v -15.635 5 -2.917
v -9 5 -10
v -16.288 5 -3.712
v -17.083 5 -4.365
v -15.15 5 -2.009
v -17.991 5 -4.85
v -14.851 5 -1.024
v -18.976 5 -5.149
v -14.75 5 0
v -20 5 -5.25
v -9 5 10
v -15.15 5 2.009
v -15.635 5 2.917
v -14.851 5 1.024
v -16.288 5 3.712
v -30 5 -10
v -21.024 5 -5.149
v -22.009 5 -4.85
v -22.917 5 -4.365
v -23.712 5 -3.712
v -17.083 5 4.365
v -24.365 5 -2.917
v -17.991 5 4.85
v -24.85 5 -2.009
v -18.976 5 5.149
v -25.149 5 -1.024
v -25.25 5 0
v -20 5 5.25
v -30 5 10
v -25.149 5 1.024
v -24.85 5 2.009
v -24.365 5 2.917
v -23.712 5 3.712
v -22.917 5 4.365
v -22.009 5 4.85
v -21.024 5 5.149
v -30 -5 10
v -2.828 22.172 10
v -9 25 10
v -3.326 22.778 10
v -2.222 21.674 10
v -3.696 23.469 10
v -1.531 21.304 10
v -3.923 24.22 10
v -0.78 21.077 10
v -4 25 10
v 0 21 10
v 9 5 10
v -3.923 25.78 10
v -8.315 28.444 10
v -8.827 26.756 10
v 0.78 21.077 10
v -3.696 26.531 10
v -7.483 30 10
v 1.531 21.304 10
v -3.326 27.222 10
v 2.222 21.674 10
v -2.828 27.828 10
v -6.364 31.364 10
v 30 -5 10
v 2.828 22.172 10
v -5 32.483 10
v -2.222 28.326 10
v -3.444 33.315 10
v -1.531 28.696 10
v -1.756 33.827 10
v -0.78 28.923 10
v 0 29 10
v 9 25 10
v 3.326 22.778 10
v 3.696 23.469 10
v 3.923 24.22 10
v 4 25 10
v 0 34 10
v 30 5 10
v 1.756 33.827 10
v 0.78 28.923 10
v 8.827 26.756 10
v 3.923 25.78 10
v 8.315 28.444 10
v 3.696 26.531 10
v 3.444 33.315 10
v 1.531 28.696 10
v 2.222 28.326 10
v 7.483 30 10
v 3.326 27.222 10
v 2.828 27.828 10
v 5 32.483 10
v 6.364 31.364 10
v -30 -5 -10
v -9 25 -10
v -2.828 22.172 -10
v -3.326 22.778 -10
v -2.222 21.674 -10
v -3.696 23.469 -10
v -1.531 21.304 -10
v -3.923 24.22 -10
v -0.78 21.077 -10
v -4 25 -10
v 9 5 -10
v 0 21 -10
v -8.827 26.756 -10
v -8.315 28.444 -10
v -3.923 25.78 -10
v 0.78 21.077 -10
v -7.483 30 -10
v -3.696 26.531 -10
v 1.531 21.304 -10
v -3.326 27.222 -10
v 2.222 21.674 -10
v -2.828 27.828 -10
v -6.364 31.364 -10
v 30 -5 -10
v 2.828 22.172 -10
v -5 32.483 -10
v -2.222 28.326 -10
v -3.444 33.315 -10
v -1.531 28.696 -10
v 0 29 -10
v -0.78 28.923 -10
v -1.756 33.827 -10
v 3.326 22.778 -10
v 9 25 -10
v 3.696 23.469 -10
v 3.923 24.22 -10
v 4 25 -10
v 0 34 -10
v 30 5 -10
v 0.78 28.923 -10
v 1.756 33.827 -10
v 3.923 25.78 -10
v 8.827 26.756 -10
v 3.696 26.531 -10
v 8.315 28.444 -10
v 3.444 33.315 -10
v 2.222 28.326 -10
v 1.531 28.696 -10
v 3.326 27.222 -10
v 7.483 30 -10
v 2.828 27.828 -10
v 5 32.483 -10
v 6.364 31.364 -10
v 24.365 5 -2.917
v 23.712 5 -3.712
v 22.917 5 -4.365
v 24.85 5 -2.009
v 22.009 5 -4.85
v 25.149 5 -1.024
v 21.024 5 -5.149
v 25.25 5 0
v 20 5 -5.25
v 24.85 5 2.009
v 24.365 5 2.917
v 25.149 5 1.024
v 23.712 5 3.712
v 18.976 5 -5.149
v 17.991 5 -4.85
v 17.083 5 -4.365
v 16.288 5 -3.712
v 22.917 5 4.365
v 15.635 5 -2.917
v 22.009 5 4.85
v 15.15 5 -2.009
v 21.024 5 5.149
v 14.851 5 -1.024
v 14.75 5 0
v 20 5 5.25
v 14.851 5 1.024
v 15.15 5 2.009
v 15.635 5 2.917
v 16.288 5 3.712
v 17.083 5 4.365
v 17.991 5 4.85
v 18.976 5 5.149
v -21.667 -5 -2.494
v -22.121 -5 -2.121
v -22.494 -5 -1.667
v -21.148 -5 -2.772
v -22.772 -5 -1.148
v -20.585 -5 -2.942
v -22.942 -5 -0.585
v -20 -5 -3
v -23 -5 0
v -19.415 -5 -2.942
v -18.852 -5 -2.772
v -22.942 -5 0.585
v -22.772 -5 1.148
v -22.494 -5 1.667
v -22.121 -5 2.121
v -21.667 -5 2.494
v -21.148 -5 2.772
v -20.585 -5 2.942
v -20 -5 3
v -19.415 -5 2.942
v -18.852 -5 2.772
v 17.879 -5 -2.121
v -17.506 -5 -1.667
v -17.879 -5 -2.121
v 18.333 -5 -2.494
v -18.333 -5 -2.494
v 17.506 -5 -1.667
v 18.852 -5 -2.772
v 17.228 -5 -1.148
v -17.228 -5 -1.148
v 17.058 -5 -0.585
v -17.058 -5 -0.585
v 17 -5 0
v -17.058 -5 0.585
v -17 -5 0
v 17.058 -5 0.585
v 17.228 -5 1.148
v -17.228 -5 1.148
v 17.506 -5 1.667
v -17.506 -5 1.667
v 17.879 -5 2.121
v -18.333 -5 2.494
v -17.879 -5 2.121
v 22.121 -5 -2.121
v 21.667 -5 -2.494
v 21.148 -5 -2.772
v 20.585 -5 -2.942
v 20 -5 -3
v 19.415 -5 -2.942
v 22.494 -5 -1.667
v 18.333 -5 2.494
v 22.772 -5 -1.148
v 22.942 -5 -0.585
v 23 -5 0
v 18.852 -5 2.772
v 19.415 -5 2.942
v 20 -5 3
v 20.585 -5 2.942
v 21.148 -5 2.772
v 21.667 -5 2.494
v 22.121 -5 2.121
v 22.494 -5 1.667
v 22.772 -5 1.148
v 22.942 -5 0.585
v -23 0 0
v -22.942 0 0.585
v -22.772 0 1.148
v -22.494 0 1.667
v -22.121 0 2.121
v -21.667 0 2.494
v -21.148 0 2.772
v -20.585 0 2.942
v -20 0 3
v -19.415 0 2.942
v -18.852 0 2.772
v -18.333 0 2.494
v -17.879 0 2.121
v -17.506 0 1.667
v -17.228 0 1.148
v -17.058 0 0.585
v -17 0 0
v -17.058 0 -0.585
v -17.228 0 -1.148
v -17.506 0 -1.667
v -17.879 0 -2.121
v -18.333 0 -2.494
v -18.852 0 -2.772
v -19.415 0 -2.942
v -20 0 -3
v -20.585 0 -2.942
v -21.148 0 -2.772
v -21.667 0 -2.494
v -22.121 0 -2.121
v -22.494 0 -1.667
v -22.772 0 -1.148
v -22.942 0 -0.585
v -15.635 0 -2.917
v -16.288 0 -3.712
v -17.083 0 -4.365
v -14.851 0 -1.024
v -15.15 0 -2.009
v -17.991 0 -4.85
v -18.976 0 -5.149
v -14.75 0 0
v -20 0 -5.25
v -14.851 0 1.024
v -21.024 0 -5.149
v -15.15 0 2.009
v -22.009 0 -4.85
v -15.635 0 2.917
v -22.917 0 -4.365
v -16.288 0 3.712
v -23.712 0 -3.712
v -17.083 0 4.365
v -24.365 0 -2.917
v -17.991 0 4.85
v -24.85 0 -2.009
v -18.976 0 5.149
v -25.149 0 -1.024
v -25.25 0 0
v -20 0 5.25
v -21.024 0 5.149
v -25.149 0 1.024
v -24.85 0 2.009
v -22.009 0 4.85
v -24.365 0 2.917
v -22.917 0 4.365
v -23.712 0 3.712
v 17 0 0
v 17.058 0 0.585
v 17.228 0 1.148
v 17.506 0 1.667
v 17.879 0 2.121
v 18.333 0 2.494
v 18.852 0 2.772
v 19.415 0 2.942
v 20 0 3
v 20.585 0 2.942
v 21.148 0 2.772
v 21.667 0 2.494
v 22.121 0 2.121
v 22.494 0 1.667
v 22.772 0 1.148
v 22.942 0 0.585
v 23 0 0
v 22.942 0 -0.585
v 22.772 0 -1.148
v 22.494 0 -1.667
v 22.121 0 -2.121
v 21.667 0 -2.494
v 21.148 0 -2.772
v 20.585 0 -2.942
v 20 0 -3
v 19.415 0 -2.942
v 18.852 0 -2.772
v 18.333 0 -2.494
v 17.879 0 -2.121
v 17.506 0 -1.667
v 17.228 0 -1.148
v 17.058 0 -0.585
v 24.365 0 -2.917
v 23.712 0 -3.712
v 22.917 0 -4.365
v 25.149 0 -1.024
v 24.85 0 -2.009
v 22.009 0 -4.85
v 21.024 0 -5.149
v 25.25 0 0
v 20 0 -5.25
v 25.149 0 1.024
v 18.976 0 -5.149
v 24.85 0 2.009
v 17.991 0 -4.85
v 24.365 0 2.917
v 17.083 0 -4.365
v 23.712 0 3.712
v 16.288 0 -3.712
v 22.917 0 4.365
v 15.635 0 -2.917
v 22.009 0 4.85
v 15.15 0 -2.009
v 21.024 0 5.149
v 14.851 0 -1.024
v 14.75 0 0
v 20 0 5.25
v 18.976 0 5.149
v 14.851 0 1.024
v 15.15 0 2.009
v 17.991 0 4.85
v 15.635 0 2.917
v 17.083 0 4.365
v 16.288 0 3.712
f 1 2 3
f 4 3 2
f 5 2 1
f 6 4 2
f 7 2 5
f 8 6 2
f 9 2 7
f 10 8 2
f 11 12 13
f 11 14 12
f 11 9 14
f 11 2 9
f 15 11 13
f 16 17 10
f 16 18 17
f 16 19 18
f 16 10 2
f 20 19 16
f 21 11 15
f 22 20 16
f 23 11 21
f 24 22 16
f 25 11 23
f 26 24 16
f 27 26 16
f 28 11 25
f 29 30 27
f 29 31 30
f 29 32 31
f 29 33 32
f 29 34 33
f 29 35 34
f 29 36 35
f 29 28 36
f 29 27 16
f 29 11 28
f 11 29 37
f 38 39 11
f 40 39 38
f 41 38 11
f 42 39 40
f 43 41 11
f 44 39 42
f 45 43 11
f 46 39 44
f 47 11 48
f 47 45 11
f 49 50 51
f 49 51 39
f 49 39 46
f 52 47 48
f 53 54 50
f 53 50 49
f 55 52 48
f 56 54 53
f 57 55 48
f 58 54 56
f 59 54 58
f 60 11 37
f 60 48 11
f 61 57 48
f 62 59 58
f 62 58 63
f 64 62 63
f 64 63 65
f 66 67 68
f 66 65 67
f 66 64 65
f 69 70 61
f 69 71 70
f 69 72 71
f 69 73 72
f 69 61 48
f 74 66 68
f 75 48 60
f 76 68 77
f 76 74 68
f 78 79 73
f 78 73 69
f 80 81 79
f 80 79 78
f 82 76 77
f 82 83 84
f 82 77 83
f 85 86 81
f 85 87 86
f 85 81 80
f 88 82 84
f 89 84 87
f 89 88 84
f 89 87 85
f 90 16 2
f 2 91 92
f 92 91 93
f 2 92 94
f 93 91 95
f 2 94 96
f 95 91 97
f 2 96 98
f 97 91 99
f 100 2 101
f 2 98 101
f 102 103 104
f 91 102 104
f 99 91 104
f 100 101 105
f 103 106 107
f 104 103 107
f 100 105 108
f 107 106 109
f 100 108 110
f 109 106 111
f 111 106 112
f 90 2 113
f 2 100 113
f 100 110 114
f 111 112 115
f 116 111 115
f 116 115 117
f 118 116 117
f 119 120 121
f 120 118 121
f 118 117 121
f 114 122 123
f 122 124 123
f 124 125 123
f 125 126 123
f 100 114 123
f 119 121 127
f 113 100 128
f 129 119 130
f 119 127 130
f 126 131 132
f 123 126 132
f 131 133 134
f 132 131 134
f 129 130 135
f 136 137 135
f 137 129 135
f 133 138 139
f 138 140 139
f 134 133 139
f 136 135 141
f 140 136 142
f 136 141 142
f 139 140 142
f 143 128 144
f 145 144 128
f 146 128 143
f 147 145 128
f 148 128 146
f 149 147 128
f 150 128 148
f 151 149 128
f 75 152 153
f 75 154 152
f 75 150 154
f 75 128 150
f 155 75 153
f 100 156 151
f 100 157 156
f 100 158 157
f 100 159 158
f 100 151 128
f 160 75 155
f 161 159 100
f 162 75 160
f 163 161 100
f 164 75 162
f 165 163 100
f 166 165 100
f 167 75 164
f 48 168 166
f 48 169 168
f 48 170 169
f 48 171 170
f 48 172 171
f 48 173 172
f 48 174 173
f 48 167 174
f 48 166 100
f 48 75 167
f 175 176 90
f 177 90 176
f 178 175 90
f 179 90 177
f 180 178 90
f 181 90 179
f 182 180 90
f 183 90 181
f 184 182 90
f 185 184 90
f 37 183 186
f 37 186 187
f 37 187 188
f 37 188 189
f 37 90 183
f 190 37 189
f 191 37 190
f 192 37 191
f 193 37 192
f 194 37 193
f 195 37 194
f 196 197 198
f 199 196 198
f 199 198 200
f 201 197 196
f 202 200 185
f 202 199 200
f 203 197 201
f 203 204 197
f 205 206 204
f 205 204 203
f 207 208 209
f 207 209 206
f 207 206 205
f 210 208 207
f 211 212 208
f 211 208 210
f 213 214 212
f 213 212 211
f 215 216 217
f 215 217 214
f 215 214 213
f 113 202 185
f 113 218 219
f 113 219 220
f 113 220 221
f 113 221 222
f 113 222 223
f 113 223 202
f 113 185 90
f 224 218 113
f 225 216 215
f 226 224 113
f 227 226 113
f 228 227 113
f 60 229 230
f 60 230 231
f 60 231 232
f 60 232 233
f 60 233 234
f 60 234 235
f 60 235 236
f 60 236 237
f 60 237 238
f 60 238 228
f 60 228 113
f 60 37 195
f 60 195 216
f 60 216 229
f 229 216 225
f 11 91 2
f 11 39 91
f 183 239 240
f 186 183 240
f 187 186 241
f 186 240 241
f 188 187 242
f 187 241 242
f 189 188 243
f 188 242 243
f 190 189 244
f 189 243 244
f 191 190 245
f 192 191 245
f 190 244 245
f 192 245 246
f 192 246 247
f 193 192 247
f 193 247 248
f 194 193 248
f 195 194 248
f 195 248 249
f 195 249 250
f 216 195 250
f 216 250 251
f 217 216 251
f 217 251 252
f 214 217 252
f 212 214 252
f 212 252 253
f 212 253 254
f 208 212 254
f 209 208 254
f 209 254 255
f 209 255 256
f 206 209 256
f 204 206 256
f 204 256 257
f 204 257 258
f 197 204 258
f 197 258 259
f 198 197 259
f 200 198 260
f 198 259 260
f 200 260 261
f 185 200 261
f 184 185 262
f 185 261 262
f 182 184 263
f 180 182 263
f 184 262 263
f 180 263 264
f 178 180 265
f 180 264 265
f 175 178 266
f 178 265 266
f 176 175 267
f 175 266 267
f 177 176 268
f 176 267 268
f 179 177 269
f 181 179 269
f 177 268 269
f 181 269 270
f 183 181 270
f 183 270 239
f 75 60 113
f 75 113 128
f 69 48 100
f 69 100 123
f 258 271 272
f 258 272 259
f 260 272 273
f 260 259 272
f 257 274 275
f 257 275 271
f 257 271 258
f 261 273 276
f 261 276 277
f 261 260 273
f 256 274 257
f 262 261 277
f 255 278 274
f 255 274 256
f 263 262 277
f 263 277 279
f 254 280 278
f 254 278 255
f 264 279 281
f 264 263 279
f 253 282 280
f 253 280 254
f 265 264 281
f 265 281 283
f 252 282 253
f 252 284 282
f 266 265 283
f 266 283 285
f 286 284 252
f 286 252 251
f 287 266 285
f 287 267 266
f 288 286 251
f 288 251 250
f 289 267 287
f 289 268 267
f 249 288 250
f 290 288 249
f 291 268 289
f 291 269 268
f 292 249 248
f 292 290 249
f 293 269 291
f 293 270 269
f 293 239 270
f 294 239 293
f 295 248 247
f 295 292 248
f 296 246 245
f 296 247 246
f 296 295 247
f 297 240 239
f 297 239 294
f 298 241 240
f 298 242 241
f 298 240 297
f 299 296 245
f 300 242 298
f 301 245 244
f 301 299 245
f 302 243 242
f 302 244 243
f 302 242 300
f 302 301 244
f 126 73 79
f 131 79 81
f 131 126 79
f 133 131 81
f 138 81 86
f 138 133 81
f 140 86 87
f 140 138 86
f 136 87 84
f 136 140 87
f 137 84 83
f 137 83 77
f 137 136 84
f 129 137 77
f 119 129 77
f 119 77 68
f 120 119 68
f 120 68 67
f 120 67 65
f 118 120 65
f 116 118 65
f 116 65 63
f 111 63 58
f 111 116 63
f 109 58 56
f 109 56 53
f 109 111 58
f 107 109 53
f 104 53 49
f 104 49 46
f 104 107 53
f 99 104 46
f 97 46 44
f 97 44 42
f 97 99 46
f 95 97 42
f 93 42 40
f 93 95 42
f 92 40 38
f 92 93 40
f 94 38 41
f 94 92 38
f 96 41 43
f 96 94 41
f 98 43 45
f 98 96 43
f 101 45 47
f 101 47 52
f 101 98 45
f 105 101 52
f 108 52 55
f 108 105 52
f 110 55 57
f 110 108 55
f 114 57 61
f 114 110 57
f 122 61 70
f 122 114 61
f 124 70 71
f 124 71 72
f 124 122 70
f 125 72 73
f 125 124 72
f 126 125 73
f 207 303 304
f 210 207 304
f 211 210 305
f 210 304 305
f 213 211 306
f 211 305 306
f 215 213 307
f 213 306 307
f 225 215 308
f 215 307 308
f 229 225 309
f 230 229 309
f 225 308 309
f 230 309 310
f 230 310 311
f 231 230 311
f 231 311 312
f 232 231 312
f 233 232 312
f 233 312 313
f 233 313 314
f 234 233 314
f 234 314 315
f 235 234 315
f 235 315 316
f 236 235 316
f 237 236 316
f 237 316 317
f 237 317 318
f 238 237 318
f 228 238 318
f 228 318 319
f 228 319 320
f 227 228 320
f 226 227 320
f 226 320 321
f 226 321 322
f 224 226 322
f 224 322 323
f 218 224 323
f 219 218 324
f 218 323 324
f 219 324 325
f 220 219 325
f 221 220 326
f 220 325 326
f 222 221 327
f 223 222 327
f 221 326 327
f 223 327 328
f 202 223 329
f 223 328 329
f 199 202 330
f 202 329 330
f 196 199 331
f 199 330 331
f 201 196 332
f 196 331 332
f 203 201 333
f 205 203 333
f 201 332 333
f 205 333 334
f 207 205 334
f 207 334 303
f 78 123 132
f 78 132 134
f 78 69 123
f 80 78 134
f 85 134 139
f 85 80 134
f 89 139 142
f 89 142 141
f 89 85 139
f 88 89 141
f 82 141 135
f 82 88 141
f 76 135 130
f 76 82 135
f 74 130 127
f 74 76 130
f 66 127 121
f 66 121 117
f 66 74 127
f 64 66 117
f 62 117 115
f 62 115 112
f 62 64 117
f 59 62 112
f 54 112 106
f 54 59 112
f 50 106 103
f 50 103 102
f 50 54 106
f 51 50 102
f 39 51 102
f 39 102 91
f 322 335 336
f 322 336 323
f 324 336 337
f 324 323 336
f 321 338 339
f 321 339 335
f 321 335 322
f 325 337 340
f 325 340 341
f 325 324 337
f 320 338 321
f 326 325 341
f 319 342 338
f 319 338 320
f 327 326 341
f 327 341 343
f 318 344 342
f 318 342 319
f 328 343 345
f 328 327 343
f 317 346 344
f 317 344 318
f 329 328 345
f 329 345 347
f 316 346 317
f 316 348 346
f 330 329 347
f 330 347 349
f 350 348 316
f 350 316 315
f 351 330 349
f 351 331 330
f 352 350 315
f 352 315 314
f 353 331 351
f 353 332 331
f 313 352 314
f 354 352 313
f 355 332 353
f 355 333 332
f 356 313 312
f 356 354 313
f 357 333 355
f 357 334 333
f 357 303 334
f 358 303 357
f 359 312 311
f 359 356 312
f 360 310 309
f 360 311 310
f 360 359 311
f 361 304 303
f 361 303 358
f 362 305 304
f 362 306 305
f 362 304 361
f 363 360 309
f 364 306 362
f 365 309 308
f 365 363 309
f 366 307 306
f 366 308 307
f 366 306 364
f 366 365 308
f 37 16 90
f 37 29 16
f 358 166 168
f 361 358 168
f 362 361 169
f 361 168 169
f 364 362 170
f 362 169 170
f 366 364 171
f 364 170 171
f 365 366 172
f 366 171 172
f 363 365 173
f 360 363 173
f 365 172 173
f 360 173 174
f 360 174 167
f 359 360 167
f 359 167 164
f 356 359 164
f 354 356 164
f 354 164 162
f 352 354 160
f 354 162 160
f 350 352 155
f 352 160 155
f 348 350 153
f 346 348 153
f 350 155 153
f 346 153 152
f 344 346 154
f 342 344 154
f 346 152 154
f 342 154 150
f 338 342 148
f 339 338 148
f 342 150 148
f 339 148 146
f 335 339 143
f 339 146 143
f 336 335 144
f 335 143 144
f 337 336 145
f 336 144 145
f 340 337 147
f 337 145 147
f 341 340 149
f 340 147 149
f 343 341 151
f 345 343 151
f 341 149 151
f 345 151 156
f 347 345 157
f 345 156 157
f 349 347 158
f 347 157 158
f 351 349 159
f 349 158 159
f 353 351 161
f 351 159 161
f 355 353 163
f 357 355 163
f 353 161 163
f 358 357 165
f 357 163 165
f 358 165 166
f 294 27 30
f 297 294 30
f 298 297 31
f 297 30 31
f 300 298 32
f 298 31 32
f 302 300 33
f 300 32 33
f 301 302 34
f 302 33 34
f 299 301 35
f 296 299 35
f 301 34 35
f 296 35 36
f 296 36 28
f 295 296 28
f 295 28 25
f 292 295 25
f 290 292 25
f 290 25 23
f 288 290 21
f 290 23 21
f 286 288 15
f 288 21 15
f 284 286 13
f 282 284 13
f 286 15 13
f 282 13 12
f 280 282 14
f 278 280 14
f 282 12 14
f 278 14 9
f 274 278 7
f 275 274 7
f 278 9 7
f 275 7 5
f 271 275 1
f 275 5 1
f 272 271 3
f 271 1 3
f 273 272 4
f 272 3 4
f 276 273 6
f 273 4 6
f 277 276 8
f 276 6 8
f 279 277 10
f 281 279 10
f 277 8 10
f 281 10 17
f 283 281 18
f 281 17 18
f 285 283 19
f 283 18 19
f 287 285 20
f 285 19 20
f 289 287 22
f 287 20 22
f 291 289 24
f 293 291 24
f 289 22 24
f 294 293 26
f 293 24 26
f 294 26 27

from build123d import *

# Parameters (mm, degrees)
F0_R     = 4
F1_DEPTH = 10
F2_R     = 3
F3_DEPTH = 10.001
F2_R_2   = 5.25
F4_DEPTH = 5


with BuildPart() as f1:
    # F0 (on Top) → F1 (new body, symmetric)
    with BuildSketch(Plane.XY):
        Polygon((-9, 5), (-30, 5), (-30, -5), (30, -5), (30, 5), (9, 5), align=None)
        with BuildLine():
            Line((-9, 25), (-9, 5))
            Line((-9, 5), (9, 5))
            Line((9, 5), (9, 25))
            ThreePointArc((9, 25), (0, 34), (-9, 25))
        make_face()
        with Locations((0, 25)):
            Circle(F0_R, mode=Mode.SUBTRACT)
    extrude(amount=F1_DEPTH, both=True)

    # F2 (on face) → F3 (cut, through all)
    with BuildSketch(Plane(origin=(0, 5, 0), x_dir=(-1, 0, 0), z_dir=(0, 1, 0))):
        with Locations((20, 0)):
            Circle(F2_R)
        with Locations((-20, 0)):
            Circle(F2_R)
    extrude(amount=-F3_DEPTH, mode=Mode.SUBTRACT)

    # F2 (on face) → F4 (cut)
    with BuildSketch(Plane(origin=(0, 5, 0), x_dir=(-1, 0, 0), z_dir=(0, 1, 0))):
        with Locations((20, 0)):
            Circle(F2_R_2)
        with Locations((20, 0)):
            Circle(F2_R, mode=Mode.SUBTRACT)
        with Locations((-20, 0)):
            Circle(F2_R_2)
        with Locations((-20, 0)):
            Circle(F2_R, mode=Mode.SUBTRACT)
    extrude(amount=-F4_DEPTH, mode=Mode.SUBTRACT)


solid = f1.part
